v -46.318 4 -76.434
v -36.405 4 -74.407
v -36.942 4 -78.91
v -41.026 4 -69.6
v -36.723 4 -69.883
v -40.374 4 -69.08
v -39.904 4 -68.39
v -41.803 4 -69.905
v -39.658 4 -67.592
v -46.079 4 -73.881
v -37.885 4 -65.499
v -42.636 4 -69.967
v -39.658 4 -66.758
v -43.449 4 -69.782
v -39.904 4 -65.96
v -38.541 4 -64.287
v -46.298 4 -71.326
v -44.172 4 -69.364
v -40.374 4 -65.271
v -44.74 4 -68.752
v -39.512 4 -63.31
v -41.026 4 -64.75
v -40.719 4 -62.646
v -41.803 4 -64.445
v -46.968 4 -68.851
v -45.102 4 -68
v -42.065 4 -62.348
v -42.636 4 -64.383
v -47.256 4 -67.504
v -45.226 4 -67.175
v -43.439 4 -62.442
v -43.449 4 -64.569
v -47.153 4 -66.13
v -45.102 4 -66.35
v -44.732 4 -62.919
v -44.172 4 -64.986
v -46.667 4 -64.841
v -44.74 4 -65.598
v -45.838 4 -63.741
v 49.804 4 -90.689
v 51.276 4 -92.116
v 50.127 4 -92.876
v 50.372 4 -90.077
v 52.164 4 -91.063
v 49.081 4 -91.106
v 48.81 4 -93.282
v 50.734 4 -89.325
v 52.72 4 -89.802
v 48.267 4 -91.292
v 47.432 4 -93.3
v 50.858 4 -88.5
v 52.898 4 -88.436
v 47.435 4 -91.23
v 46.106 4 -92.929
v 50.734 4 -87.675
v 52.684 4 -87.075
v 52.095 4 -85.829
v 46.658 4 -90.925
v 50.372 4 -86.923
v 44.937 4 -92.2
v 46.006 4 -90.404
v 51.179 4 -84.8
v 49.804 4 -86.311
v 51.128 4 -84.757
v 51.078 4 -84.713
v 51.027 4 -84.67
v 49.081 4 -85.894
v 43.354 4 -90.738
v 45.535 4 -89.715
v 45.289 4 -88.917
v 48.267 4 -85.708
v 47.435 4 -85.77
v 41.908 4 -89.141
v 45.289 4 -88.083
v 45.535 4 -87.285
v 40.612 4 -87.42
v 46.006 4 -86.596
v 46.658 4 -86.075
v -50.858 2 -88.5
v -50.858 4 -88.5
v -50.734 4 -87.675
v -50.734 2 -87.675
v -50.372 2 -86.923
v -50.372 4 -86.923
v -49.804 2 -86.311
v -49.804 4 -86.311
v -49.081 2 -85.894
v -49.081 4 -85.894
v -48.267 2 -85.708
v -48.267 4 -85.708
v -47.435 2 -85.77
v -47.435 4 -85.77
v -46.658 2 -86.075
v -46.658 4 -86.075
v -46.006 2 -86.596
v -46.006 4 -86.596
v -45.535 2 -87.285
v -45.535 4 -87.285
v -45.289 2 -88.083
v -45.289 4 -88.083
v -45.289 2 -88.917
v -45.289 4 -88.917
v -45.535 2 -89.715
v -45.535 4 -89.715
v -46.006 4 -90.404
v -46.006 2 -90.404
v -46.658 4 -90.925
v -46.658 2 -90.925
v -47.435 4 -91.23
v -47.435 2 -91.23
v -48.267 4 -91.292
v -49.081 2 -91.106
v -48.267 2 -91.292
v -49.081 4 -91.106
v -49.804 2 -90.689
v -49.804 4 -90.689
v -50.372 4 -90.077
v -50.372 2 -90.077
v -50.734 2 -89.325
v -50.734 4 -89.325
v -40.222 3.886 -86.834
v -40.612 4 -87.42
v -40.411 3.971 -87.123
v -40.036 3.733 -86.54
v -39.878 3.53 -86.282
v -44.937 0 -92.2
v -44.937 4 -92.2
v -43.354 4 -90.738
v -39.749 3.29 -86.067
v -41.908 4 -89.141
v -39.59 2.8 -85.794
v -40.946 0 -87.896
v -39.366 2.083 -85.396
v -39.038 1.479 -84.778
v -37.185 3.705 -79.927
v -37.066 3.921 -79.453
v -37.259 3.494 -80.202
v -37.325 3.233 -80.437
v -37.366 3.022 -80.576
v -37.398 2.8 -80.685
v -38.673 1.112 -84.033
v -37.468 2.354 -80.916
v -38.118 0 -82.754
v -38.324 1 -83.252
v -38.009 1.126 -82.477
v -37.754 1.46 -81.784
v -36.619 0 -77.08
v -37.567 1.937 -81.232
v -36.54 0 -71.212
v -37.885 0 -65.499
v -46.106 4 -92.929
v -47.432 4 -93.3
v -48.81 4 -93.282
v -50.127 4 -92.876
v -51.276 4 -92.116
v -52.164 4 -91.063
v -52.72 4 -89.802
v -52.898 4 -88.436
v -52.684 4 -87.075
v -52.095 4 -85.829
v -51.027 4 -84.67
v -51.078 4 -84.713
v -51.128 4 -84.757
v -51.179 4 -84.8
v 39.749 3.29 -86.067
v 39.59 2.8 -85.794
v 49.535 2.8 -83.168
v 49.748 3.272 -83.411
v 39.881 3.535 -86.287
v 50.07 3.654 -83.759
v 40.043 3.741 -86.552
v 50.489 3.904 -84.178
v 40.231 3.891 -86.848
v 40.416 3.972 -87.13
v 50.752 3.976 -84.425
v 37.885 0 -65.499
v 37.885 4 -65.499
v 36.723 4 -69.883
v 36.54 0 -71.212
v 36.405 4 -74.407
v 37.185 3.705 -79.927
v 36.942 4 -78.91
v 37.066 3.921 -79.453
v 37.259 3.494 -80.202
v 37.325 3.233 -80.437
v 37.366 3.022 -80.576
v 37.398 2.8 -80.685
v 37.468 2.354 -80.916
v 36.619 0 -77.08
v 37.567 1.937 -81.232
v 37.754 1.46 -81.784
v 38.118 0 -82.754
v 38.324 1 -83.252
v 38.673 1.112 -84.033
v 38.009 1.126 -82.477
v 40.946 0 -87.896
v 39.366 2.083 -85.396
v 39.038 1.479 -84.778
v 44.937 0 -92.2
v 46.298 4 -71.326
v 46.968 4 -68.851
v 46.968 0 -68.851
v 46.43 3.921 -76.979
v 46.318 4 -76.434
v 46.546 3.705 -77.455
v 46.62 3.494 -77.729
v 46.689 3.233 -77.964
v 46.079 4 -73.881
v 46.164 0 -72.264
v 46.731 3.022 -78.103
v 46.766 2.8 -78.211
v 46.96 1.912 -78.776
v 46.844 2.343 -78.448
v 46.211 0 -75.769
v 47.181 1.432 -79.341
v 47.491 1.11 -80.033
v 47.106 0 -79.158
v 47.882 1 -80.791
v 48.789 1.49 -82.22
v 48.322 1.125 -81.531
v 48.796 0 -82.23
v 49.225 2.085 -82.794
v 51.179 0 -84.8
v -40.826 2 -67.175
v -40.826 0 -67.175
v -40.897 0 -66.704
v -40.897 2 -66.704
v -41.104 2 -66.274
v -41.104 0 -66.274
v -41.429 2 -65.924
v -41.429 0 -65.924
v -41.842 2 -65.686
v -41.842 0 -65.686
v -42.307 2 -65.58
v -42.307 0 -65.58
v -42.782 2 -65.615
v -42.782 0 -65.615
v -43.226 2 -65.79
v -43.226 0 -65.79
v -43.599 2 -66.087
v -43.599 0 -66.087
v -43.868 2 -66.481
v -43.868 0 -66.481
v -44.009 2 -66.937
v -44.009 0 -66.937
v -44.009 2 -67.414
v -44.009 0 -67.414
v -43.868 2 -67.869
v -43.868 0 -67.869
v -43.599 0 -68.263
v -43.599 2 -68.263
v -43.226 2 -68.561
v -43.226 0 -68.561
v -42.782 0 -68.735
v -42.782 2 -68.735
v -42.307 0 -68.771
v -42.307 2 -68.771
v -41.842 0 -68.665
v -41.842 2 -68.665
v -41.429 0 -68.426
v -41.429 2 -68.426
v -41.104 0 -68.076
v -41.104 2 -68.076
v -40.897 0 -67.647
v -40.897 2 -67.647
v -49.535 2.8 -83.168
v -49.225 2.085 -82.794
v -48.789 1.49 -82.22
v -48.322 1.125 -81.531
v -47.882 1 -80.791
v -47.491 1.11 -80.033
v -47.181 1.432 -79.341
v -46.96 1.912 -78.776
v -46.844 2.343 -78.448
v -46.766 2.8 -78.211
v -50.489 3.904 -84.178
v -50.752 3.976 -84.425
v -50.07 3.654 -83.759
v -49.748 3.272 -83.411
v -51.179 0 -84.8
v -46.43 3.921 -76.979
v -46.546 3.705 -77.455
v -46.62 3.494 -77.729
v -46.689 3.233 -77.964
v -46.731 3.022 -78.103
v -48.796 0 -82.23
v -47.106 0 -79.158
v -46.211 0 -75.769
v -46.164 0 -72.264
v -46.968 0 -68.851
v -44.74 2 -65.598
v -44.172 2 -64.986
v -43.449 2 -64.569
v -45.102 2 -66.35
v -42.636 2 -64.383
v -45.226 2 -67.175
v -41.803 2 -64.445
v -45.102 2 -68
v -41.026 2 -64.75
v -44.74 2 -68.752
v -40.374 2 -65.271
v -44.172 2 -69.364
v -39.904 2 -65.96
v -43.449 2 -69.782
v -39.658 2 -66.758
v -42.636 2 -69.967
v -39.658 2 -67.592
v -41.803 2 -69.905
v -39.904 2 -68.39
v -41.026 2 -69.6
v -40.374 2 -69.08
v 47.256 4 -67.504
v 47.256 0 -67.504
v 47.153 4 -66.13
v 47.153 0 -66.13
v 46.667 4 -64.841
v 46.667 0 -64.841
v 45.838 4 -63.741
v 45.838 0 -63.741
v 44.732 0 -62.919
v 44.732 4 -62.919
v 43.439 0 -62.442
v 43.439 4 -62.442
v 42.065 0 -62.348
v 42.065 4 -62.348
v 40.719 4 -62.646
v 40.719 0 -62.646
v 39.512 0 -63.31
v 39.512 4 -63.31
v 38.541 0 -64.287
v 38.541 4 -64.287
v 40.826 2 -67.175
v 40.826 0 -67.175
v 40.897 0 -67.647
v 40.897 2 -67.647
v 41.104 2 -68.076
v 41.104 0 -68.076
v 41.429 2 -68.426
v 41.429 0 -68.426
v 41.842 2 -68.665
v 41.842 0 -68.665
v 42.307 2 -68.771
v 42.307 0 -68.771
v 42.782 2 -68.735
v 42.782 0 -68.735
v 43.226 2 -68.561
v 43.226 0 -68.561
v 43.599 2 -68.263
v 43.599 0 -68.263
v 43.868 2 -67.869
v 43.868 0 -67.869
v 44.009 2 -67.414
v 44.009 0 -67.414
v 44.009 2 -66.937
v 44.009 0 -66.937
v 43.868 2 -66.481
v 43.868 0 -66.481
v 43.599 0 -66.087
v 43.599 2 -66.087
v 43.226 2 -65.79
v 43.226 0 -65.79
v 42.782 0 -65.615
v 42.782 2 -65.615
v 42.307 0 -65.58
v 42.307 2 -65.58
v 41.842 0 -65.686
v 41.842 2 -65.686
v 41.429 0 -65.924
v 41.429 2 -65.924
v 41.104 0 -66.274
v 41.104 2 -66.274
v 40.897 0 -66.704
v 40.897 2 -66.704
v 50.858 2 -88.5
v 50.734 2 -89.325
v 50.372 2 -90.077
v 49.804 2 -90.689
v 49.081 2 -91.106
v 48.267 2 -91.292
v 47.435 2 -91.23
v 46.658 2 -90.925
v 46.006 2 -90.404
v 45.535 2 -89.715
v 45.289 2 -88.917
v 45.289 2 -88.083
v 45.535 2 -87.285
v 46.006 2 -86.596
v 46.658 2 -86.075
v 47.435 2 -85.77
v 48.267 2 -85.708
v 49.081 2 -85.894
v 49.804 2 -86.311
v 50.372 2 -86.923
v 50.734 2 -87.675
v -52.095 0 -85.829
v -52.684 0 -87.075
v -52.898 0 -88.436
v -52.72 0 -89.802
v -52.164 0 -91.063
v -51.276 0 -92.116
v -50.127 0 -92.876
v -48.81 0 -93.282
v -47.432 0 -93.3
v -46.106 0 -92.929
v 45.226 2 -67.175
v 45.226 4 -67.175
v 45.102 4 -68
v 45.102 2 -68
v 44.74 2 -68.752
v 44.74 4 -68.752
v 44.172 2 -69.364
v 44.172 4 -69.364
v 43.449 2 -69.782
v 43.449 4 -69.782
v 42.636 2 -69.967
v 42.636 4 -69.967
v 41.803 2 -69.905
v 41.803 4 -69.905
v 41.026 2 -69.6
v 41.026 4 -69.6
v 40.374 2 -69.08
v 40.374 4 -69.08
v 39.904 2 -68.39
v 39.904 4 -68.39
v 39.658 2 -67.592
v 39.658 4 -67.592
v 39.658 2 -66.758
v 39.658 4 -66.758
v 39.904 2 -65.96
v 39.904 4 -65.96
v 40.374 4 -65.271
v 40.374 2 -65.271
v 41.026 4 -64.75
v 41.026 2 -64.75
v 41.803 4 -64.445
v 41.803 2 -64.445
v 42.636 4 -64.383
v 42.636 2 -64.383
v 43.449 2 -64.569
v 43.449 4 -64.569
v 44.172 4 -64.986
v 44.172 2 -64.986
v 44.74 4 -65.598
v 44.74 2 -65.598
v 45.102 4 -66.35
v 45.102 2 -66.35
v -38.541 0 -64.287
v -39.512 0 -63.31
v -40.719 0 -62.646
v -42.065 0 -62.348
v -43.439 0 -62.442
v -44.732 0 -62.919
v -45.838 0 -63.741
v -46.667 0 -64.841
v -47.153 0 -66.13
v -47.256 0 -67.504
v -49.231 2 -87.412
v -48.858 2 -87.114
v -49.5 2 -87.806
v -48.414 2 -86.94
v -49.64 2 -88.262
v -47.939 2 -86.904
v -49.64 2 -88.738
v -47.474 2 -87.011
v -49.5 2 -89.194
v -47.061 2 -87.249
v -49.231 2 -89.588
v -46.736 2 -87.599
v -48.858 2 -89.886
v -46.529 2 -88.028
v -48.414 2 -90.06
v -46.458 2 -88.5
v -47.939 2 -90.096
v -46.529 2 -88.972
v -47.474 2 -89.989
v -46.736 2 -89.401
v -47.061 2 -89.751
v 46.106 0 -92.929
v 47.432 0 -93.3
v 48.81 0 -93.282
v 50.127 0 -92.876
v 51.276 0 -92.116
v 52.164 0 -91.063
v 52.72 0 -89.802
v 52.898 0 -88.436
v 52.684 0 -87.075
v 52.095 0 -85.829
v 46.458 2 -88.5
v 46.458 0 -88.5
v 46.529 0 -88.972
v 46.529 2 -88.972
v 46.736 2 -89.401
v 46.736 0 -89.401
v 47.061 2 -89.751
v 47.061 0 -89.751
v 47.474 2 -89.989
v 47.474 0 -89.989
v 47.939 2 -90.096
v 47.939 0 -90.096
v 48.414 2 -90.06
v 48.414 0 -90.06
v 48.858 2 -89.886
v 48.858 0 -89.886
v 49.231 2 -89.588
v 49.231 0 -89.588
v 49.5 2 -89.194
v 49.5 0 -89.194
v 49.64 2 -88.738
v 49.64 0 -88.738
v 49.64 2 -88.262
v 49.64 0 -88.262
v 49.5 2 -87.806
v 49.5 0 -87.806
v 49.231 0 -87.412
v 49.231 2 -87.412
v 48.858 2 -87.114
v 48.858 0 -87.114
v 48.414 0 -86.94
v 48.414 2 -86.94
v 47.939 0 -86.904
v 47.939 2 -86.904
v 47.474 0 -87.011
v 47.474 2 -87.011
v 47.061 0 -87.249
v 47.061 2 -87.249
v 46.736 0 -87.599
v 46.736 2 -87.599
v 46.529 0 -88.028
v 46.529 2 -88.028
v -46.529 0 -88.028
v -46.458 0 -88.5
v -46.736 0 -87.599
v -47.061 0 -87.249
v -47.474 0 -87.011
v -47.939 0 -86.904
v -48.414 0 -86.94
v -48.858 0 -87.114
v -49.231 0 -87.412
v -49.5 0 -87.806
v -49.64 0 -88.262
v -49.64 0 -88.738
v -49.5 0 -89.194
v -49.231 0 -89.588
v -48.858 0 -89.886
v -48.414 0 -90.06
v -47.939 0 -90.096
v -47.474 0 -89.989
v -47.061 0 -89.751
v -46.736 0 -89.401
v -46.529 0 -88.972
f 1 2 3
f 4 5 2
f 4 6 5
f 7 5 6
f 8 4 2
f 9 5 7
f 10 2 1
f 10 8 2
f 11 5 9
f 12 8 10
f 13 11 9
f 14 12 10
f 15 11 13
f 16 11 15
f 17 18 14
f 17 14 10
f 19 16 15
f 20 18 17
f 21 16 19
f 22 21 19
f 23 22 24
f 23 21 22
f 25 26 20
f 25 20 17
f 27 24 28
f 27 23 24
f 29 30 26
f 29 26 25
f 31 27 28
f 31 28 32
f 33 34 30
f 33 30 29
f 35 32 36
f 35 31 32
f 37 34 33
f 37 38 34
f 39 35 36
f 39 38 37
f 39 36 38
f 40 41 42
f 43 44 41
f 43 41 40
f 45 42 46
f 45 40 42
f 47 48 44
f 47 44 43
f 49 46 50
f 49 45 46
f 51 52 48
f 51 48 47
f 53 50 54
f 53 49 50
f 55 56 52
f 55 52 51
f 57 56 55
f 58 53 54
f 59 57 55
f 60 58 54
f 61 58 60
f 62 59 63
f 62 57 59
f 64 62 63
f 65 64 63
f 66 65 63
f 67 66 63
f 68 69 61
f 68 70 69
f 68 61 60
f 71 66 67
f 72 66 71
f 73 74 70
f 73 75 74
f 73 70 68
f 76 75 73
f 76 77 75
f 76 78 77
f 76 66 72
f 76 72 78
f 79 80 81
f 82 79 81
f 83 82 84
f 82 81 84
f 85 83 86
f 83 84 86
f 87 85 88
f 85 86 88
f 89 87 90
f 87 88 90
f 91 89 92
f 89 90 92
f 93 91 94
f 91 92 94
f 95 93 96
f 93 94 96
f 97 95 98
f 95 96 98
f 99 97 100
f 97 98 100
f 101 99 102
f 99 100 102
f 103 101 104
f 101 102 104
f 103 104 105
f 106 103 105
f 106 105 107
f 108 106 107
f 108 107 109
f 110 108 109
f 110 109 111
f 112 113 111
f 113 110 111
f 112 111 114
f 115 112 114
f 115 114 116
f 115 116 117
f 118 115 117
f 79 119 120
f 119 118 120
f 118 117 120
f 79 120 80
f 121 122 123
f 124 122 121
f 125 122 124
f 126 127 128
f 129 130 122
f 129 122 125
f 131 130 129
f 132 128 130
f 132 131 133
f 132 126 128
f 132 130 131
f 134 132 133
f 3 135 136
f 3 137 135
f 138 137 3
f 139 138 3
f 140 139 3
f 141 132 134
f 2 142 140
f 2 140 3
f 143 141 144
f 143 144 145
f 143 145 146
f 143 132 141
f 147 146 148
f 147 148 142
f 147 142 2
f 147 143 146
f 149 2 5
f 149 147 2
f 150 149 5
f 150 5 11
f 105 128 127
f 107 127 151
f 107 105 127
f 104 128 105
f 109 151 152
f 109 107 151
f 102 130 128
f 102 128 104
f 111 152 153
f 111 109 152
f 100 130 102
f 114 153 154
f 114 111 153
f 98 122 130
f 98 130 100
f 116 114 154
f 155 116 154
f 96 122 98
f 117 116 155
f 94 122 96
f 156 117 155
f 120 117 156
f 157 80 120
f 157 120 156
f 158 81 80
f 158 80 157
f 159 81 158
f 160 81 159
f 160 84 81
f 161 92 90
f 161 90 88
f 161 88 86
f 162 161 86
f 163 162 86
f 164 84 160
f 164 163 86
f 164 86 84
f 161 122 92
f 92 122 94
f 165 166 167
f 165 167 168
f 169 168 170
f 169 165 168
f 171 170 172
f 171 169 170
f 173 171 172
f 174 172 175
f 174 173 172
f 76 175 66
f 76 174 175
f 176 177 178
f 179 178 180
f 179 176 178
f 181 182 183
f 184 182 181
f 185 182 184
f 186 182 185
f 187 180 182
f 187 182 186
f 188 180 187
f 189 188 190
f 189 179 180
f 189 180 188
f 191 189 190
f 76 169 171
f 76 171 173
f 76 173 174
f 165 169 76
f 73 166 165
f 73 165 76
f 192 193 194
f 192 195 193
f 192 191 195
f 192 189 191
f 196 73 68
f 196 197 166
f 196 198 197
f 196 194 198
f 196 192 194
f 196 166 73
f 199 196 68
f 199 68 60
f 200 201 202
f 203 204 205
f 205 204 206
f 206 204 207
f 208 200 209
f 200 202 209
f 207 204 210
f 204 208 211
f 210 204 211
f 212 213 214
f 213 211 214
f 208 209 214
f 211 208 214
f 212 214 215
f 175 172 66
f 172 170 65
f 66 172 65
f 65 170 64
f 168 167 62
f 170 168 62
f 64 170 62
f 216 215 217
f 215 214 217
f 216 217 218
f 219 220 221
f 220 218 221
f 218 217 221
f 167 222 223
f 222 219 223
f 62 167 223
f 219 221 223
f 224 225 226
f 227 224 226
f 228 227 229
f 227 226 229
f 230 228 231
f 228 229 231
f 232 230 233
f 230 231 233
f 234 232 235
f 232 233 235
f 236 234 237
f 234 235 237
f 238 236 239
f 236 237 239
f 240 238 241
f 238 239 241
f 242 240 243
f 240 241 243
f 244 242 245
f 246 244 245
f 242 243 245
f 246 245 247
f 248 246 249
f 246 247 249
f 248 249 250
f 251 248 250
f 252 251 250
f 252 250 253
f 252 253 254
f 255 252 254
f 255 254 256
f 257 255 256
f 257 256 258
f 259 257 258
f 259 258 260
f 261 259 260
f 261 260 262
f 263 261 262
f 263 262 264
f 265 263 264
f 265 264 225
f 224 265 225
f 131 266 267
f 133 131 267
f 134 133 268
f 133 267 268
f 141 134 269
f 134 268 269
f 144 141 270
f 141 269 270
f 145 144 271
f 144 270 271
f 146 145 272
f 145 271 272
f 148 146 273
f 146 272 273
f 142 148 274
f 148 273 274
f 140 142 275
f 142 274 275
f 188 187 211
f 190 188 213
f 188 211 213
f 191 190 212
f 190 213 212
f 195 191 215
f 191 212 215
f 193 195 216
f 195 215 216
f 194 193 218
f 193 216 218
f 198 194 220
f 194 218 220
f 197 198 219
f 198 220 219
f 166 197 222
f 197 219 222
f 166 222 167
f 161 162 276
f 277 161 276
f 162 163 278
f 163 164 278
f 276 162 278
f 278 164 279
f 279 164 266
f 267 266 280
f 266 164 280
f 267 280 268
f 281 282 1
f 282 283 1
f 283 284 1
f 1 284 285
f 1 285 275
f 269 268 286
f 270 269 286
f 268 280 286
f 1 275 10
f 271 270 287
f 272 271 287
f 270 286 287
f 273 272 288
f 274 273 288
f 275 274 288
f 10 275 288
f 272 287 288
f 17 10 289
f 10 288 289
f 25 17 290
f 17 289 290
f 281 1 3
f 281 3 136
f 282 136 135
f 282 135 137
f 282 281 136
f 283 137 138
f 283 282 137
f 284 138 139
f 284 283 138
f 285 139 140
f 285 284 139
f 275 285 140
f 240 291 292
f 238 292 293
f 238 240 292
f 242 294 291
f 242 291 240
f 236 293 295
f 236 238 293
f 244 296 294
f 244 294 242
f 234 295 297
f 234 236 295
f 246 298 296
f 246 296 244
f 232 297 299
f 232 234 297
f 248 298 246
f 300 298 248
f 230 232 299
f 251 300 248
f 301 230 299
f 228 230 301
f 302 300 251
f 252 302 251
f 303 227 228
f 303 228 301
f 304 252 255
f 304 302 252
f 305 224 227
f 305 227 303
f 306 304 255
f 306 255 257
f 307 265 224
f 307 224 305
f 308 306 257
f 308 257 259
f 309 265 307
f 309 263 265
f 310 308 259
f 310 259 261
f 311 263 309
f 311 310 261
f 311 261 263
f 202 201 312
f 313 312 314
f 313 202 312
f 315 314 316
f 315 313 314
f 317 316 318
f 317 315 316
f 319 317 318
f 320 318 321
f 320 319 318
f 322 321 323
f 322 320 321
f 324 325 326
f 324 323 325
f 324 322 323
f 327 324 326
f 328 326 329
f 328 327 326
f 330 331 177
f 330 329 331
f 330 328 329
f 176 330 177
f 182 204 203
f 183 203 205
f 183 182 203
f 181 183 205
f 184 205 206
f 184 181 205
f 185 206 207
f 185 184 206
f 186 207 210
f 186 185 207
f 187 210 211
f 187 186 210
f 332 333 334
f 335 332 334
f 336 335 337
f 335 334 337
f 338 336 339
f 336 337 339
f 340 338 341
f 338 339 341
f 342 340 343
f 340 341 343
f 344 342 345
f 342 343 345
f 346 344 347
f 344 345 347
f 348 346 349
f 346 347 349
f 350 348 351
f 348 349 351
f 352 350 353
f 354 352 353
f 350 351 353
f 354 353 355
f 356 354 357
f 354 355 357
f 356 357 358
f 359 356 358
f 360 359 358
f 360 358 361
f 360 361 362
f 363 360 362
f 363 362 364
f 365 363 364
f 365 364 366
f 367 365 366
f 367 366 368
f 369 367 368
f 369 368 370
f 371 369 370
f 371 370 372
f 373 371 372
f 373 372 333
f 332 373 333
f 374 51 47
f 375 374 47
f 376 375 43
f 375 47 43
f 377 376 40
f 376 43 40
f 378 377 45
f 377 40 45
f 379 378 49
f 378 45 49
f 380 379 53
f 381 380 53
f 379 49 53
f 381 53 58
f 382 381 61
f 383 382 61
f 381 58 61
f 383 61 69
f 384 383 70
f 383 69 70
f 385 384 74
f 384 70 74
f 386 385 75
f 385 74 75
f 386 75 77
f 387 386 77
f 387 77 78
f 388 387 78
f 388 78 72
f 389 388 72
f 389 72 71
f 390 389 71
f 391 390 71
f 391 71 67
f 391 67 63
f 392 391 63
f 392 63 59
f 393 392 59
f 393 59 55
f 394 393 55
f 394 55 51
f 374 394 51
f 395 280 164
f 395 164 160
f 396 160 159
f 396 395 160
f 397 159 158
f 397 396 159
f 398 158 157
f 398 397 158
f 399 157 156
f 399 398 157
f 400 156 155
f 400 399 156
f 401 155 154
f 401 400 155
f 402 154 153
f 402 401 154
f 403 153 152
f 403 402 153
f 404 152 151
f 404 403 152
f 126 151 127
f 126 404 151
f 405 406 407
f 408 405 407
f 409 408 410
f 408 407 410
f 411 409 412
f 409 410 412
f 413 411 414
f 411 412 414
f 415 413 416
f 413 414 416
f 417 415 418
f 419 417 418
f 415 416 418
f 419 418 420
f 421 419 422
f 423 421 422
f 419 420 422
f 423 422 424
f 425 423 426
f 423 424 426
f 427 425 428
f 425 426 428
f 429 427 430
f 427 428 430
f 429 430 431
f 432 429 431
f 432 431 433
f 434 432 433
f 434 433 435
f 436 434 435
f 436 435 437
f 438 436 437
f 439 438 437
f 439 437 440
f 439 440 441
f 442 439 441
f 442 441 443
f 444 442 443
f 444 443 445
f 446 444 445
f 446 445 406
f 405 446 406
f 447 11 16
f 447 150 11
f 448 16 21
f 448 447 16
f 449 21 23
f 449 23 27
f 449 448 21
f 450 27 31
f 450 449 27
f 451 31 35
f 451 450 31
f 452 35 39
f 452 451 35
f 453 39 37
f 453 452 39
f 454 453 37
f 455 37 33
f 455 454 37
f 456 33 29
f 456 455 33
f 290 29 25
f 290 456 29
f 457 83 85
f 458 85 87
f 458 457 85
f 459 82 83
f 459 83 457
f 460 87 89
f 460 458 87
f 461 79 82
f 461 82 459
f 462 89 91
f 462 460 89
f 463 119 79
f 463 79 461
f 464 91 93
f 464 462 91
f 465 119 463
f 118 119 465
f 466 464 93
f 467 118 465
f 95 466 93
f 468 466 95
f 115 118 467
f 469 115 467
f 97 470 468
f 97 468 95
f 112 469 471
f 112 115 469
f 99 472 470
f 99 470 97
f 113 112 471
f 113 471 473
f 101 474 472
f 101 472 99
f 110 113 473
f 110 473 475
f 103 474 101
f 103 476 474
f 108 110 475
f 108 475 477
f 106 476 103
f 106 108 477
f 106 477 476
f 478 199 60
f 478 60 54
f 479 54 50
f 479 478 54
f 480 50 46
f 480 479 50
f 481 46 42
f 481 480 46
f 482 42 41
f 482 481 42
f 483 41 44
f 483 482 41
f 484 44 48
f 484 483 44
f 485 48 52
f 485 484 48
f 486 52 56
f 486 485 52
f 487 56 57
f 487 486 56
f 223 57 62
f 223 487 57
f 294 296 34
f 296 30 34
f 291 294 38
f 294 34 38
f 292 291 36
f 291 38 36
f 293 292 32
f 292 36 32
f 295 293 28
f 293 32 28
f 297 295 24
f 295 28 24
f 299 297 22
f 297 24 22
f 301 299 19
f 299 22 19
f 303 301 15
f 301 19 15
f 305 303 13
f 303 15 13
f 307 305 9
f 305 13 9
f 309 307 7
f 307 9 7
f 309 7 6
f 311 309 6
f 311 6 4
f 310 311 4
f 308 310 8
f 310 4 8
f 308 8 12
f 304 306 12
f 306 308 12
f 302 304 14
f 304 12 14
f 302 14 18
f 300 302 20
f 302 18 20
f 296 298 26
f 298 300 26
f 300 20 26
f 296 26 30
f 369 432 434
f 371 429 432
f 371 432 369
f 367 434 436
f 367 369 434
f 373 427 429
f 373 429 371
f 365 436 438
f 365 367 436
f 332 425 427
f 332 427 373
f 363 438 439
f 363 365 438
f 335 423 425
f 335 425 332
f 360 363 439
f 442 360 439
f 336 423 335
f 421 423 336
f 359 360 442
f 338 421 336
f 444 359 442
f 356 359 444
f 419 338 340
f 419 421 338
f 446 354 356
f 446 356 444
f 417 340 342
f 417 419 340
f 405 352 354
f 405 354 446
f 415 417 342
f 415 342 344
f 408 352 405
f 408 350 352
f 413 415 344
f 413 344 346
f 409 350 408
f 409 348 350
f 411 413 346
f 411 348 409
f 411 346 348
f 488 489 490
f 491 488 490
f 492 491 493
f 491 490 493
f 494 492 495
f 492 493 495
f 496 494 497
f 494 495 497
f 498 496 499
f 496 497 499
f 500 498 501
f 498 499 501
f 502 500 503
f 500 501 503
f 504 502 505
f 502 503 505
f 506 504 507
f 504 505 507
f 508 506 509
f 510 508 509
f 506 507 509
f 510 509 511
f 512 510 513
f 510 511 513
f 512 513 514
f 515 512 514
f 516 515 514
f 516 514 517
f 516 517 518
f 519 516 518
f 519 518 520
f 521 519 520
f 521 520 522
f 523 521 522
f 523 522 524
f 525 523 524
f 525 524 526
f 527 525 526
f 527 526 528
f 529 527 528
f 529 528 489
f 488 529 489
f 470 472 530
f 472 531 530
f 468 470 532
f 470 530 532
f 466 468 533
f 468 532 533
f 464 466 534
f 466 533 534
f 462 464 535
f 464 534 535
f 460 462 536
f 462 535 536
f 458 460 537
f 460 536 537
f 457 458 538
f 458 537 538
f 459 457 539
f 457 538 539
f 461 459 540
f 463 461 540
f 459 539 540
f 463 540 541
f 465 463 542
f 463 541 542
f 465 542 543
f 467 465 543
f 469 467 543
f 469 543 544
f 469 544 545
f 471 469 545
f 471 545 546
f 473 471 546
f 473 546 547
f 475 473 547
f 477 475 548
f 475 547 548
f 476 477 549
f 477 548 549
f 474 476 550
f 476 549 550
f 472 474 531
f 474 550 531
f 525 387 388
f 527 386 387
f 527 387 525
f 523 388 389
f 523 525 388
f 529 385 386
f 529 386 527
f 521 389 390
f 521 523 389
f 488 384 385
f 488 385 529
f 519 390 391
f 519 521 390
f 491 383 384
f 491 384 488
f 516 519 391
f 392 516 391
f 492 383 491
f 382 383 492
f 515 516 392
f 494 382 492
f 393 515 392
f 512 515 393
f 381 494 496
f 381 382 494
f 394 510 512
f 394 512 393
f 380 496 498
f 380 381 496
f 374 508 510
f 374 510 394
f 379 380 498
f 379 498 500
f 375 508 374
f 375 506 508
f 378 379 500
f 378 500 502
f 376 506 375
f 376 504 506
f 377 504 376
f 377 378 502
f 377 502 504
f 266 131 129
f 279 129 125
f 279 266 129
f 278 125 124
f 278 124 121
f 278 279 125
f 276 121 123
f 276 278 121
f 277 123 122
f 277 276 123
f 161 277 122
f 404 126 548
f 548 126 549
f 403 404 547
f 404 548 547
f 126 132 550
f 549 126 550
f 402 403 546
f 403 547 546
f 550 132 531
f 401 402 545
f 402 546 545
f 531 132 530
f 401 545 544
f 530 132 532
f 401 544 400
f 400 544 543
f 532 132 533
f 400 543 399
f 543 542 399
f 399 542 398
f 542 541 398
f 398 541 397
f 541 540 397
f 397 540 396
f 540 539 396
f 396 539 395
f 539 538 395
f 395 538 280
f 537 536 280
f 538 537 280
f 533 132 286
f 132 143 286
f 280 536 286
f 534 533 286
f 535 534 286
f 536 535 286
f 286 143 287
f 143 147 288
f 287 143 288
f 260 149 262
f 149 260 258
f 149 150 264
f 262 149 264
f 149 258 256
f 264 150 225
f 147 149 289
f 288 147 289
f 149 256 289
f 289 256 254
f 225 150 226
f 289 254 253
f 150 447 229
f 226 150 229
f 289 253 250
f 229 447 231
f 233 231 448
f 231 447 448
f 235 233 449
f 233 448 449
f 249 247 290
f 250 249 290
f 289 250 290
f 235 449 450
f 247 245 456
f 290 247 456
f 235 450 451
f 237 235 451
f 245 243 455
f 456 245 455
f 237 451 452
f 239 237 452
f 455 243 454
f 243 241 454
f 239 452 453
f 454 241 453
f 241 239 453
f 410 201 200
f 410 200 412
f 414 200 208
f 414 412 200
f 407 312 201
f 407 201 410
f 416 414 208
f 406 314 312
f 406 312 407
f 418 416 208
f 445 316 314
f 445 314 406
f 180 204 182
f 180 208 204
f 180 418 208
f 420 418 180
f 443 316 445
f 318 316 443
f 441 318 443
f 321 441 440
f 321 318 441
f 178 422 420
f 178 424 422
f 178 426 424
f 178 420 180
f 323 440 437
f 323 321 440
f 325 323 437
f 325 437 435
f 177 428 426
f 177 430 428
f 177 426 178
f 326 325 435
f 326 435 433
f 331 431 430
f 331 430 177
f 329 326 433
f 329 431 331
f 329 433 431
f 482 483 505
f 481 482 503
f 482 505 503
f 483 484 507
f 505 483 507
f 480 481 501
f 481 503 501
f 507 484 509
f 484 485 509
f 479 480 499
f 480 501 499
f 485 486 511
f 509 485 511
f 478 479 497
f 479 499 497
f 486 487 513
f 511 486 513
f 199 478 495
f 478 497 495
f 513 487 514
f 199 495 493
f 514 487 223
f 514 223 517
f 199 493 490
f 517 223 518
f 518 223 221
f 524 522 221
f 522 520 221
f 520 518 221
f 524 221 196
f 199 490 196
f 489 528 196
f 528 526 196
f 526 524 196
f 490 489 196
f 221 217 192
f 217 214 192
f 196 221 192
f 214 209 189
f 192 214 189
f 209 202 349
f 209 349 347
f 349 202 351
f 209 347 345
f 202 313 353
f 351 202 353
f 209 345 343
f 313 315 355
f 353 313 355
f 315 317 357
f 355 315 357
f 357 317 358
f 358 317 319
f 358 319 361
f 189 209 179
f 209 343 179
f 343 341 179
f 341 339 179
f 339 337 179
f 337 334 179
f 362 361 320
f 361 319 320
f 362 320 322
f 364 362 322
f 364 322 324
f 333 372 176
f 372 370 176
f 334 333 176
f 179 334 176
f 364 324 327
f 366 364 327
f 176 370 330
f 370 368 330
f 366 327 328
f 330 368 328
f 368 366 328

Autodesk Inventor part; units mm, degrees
ref_plane "YZ Plane" through (0, 0, 0) normal (1, 0, 0) x (0, 1, 0)
sketch "Sketch1" plane through (0, 0, 0) normal (0, 1, 0) x (-1, 0, 0)
  circle A0 centre (0, 0) radius 110 construction
  arc A1 (43.0581, -98.5) -> (-43.0581, -98.5) centre (0, 0) ccw
  line L0 (0, -107.5) -> (0, -98.5) construction
  line L1 (0, -98.5) -> (0, -73.5) construction
  line L2 (0, -98.5) -> (-43.0581, -98.5) construction
  line L3 (0, -98.5) -> (43.0581, -98.5) construction
  line L4 (43.0581, -98.5) -> (-43.0581, -98.5) construction
  line L5 (-18.0581, -73.5) -> (18.0581, -73.5)
  arc A2 (43.0581, -98.5) -> (18.0581, -73.5) centre (18.0581, -98.5) ccw
  arc A3 (-18.0581, -73.5) -> (-43.0581, -98.5) centre (-18.0581, -98.5) ccw
  line L6 (0, 107.5) -> (0, 97.5) construction
  line L7 (0, 97.5) -> (-22.5, 97.5) construction
  line L8 (-22.5, 97.5) -> (-22.5, 82.5) construction
  line L9 (22.5, 82.5) -> (22.5, 97.5) construction
  line L10 (22.5, 90) -> (-22.5, 90) construction
  line L11 (15, 97.5) -> (-15, 97.5)
  line L12 (-15, 82.5) -> (15, 82.5)
  arc A4 (15, 82.5) -> (15, 97.5) centre (15, 90) ccw
  arc A5 (-15, 97.5) -> (-15, 82.5) centre (-15, 90) ccw
  line L13 (22.5, 82.5) -> (17.5, 82.5) construction
  line L14 (17.5, 82.5) -> (17.5, 77.5) construction
  circle A6 centre (17.5, 77.5) radius 1.6
  circle A7 centre (-17.5, 77.5) radius 1.6
  line L15 (-58.336309, 79.549513) -> (-79.549513, 58.336309)
  arc A8 (-47.729708, 68.942911) -> (-58.336309, 79.549513) centre (-53.033009, 74.246212) ccw
  arc A9 (-79.549513, 58.336309) -> (-68.942911, 47.729708) centre (-74.246212, 53.033009) ccw
  line L16 (-68.942911, 47.729708) -> (-47.729708, 68.942911)
  circle A10 centre (-67.175144, 42.426407) radius 1.6
  circle A11 centre (-42.426407, 67.175144) radius 1.6
  line L17 (-97.5, 15) -> (-97.5, -15)
  arc A12 (-82.5, 15) -> (-97.5, 15) centre (-90, 15) ccw
  arc A13 (-97.5, -15) -> (-82.5, -15) centre (-90, -15) ccw
  line L18 (-82.5, -15) -> (-82.5, 15)
  circle A14 centre (-77.5, -17.5) radius 1.6
  circle A15 centre (-77.5, 17.5) radius 1.6
  line L19 (-79.549513, -58.336309) -> (-58.336309, -79.549513)
  arc A16 (-68.942911, -47.729708) -> (-79.549513, -58.336309) centre (-74.246212, -53.033009) ccw
  arc A17 (-58.336309, -79.549513) -> (-47.729708, -68.942911) centre (-53.033009, -74.246212) ccw
  line L20 (-47.729708, -68.942911) -> (-68.942911, -47.729708)
  circle A18 centre (-42.426407, -67.175144) radius 1.6
  circle A19 centre (-67.175144, -42.426407) radius 1.6
  line L21 (-15, -97.5) -> (15, -97.5)
  arc A20 (-15, -82.5) -> (-15, -97.5) centre (-15, -90) ccw
  arc A21 (15, -97.5) -> (15, -82.5) centre (15, -90) ccw
  line L22 (15, -82.5) -> (-15, -82.5)
  circle A22 centre (17.5, -77.5) radius 1.6
  circle A23 centre (-17.5, -77.5) radius 1.6
  line L23 (58.336309, -79.549513) -> (79.549513, -58.336309)
  arc A24 (47.729708, -68.942911) -> (58.336309, -79.549513) centre (53.033009, -74.246212) ccw
  arc A25 (79.549513, -58.336309) -> (68.942911, -47.729708) centre (74.246212, -53.033009) ccw
  line L24 (68.942911, -47.729708) -> (47.729708, -68.942911)
  circle A26 centre (67.175144, -42.426407) radius 1.6
  circle A27 centre (42.426407, -67.175144) radius 1.6
  line L25 (97.5, -15) -> (97.5, 15)
  arc A28 (82.5, -15) -> (97.5, -15) centre (90, -15) ccw
  arc A29 (97.5, 15) -> (82.5, 15) centre (90, 15) ccw
  line L26 (82.5, 15) -> (82.5, -15)
  circle A30 centre (77.5, 17.5) radius 1.6
  circle A31 centre (77.5, -17.5) radius 1.6
  line L27 (79.549513, 58.336309) -> (58.336309, 79.549513)
  arc A32 (68.942911, 47.729708) -> (79.549513, 58.336309) centre (74.246212, 53.033009) ccw
  arc A33 (58.336309, 79.549513) -> (47.729708, 68.942911) centre (53.033009, 74.246212) ccw
  line L28 (47.729708, 68.942911) -> (68.942911, 47.729708)
  circle A34 centre (42.426407, 67.175144) radius 1.6
  circle A35 centre (67.175144, 42.426407) radius 1.6
  line L29 (58.336309, -58.336309) -> (51.265242, -51.265242) construction
  line L30 (40.65864, -61.871843) -> (61.871843, -40.65864)
  arc A36 (40.65864, -61.871843) -> (44.52672, -89.539774) centre (53.033009, -74.246212) ccw
  arc A37 (89.539774, -44.52672) -> (61.871843, -40.65864) centre (74.246212, -53.033009) ccw
  line L31 (0, -73.5) -> (0, -66.5) construction
  arc A38 (44.52672, 89.539774) -> (40.65864, 61.871843) centre (53.033009, 74.246212) ccw
  line L32 (61.871843, 40.65864) -> (40.65864, 61.871843)
  arc A39 (61.871843, 40.65864) -> (89.539774, 44.52672) centre (74.246212, 53.033009) ccw
  arc A40 (-89.539774, 44.52672) -> (-61.871843, 40.65864) centre (-74.246212, 53.033009) ccw
  line L33 (-40.65864, 61.871843) -> (-61.871843, 40.65864)
  arc A41 (-40.65864, 61.871843) -> (-44.52672, 89.539774) centre (-53.033009, 74.246212) ccw
  arc A42 (-44.52672, -89.539774) -> (-40.65864, -61.871843) centre (-53.033009, -74.246212) ccw
  line L34 (-61.871843, -40.65864) -> (-40.65864, -61.871843)
  arc A43 (-61.871843, -40.65864) -> (-89.539774, -44.52672) centre (-74.246212, -53.033009) ccw
  arc A44 (89.539774, -44.52672) -> (89.539774, 44.52672) centre (0, 0) ccw
  arc A45 (44.52672, 89.539774) -> (-44.52672, 89.539774) centre (0, 0) ccw
  arc A46 (-89.539774, 44.52672) -> (-89.539774, -44.52672) centre (0, 0) ccw
  line L35 (43.0581, -98.5) -> (48.0581, -98.5) construction
  line L36 (48.0581, -98.5) -> (48.0581, -88.5) construction
  circle A47 centre (48.0581, -88.5) radius 1.6
  circle A48 centre (-48.0581, -88.5) radius 1.6
  line L37 (18.0581, -66.5) -> (-18.0581, -66.5)
  arc A49 (17.5, -66.5) -> (43.0581, -59.472383) centre (19.514525, -23.837671) ccw
  arc A50 (-44.52672, -58.003763) -> (-18.0581, -66.5) centre (-19.508856, -25.542168) ccw
  arc A51 (-48.0581, -88.5) -> (-42.426407, -67.175144) centre (-60.43967, -73.824078) ccw construction
  arc A52 (-48.0581, -88.5) -> (-42.426407, -67.175144) centre (-60.43967, -73.824078) ccw construction
  arc A53 (-44.936716, -92.199789) -> (-37.885276, -65.498953) centre (-60.43967, -73.824078) ccw
  arc A54 (-51.179485, -84.800211) -> (-46.967537, -68.851335) centre (-60.43967, -73.824078) ccw
  arc A55 (-51.179485, -84.800211) -> (-44.936716, -92.199789) centre (-48.0581, -88.5) ccw
  arc A56 (-37.885276, -65.498953) -> (-46.967537, -68.851335) centre (-42.426407, -67.175144) ccw
  point P0 (0, 90)
  point P1 (-45.961941, 70.710678)
  point P2 (-82.5, 17.5)
  point P3 (-70.710678, -45.961941)
  point P4 (-17.5, -82.5)
  point P5 (45.961941, -70.710678)
  point P6 (82.5, -17.5)
  point P7 (70.710678, 45.961941)
  point P8 (35.715922, -76.769806)
  point P9 (-37.90233, -65.453455)
  point P10 (-39.097126, -63.661261)
  point P11 (-46.422064, -70.704261)
  point P12 (-46.867306, -78.516354)
  point P13 (0, -44.52672)
  point P14 (0, 35.701561)
  dimension "d0" = 220
  dimension "d1" = 215
  dimension "d2" = 9
  dimension "d3" = 25
  dimension "d4" = 10
  dimension "d5" = 22.5
  dimension "d6" = 15
  dimension "d7" = 45
  dimension "d8" = 5
  dimension "d9" = 5
  dimension "d10" = 3.2
  dimension "d15" = 86.1162
  dimension "d16" = 45
  dimension "d19" = 360
  dimension "d22" = 10
  dimension "d23" = 7
  dimension "d26" = 360
  dimension "d33" = 5
  dimension "d34" = 10
  dimension "d35" = 3.2
extrude "Extrusion5" add sketch "Sketch1" along normal blind 4 contours A53 A55 A54 A17 A56 A42 | A42 A56 | A54 A17
sketch "Sketch6" plane through (0, 4, 0) normal (0, 1, 0) x (1, 0, 0)
  circle A0 centre (42.426407, 67.175144) radius 1.6
  circle A1 centre (42.426407, 67.175144) radius 2.8
  circle A2 centre (48.0581, 88.5) radius 1.6
  circle A3 centre (48.0581, 88.5) radius 2.8
  point P0 (0, 0)
  dimension "d56" = 5.6
  dimension "d57" = 5.6
extrude "Extrusion6" cut sketch "Sketch6" against normal blind 2 contours A0 | A1 | A2 | A3
ref_plane "Work Plane2" through (37.885276, 0, -65.498953) normal (-0.9668522, 0, -0.2553366) x (0, 1, 0)
sketch "Sketch7" plane through (37.885276, 0, -65.498953) normal (-0.9668522, 0, -0.2553366) x (0, 1, 0)
  line L0 (0, 27.616253) -> (4, 27.616253)
  line L1 (2, 27.616253) -> (2, 0) construction
  line L2 (0, 0) -> (4, 0)
  line L3 (2, 13.808127) -> (5.678788, 13.808127) construction
  line L4 (5.678788, 13.808127) -> (5.678788, 17.308127) construction
  line L5 (5.678788, 17.308127) -> (4, 17.308127) construction
  line L6 (4, 0) -> (4, 27.616253) construction
  circle A0 centre (4, 17.308127) radius 3
  point P0 (0, -73.001305)
  dimension "d60" = 27.61625
  dimension "d61" = 13.80813
  dimension "d62" = 3.5
  dimension "d63" = 6
extrude "Extrusion7" cut sketch "Sketch7" along normal mid plane 19.75
fillet "Fillet3" radius 2 2 edges at (44.7193, 4, -84.6985) (42.0093, 4, -79.2085)
sketch "Sketch8" plane through (0, 4, 0) normal (0, 1, 0) x (1, 0, 0)
  point P0 (0, 0)
  point P1 (0, 45.087656)
  point P2 (0, -47.461168)
ref_plane "Work Plane4" through (0, 0, -44.52672) normal (1, 0, 0) x (0, 0.9903099, -0.1388753)
mirror "Mirror2" about plane through (0, 0, -44.52672) normal (1, 0, 0) of "Extrusion5", "Extrusion6", "Extrusion7", "Fillet3"
ref_plane "Work Plane5" through (-37.885276, 0, -65.498953) normal (-0.9668522, 0, 0.2553366) x (0, 1, 0)
properties part number "MettalringUnten_v3"
